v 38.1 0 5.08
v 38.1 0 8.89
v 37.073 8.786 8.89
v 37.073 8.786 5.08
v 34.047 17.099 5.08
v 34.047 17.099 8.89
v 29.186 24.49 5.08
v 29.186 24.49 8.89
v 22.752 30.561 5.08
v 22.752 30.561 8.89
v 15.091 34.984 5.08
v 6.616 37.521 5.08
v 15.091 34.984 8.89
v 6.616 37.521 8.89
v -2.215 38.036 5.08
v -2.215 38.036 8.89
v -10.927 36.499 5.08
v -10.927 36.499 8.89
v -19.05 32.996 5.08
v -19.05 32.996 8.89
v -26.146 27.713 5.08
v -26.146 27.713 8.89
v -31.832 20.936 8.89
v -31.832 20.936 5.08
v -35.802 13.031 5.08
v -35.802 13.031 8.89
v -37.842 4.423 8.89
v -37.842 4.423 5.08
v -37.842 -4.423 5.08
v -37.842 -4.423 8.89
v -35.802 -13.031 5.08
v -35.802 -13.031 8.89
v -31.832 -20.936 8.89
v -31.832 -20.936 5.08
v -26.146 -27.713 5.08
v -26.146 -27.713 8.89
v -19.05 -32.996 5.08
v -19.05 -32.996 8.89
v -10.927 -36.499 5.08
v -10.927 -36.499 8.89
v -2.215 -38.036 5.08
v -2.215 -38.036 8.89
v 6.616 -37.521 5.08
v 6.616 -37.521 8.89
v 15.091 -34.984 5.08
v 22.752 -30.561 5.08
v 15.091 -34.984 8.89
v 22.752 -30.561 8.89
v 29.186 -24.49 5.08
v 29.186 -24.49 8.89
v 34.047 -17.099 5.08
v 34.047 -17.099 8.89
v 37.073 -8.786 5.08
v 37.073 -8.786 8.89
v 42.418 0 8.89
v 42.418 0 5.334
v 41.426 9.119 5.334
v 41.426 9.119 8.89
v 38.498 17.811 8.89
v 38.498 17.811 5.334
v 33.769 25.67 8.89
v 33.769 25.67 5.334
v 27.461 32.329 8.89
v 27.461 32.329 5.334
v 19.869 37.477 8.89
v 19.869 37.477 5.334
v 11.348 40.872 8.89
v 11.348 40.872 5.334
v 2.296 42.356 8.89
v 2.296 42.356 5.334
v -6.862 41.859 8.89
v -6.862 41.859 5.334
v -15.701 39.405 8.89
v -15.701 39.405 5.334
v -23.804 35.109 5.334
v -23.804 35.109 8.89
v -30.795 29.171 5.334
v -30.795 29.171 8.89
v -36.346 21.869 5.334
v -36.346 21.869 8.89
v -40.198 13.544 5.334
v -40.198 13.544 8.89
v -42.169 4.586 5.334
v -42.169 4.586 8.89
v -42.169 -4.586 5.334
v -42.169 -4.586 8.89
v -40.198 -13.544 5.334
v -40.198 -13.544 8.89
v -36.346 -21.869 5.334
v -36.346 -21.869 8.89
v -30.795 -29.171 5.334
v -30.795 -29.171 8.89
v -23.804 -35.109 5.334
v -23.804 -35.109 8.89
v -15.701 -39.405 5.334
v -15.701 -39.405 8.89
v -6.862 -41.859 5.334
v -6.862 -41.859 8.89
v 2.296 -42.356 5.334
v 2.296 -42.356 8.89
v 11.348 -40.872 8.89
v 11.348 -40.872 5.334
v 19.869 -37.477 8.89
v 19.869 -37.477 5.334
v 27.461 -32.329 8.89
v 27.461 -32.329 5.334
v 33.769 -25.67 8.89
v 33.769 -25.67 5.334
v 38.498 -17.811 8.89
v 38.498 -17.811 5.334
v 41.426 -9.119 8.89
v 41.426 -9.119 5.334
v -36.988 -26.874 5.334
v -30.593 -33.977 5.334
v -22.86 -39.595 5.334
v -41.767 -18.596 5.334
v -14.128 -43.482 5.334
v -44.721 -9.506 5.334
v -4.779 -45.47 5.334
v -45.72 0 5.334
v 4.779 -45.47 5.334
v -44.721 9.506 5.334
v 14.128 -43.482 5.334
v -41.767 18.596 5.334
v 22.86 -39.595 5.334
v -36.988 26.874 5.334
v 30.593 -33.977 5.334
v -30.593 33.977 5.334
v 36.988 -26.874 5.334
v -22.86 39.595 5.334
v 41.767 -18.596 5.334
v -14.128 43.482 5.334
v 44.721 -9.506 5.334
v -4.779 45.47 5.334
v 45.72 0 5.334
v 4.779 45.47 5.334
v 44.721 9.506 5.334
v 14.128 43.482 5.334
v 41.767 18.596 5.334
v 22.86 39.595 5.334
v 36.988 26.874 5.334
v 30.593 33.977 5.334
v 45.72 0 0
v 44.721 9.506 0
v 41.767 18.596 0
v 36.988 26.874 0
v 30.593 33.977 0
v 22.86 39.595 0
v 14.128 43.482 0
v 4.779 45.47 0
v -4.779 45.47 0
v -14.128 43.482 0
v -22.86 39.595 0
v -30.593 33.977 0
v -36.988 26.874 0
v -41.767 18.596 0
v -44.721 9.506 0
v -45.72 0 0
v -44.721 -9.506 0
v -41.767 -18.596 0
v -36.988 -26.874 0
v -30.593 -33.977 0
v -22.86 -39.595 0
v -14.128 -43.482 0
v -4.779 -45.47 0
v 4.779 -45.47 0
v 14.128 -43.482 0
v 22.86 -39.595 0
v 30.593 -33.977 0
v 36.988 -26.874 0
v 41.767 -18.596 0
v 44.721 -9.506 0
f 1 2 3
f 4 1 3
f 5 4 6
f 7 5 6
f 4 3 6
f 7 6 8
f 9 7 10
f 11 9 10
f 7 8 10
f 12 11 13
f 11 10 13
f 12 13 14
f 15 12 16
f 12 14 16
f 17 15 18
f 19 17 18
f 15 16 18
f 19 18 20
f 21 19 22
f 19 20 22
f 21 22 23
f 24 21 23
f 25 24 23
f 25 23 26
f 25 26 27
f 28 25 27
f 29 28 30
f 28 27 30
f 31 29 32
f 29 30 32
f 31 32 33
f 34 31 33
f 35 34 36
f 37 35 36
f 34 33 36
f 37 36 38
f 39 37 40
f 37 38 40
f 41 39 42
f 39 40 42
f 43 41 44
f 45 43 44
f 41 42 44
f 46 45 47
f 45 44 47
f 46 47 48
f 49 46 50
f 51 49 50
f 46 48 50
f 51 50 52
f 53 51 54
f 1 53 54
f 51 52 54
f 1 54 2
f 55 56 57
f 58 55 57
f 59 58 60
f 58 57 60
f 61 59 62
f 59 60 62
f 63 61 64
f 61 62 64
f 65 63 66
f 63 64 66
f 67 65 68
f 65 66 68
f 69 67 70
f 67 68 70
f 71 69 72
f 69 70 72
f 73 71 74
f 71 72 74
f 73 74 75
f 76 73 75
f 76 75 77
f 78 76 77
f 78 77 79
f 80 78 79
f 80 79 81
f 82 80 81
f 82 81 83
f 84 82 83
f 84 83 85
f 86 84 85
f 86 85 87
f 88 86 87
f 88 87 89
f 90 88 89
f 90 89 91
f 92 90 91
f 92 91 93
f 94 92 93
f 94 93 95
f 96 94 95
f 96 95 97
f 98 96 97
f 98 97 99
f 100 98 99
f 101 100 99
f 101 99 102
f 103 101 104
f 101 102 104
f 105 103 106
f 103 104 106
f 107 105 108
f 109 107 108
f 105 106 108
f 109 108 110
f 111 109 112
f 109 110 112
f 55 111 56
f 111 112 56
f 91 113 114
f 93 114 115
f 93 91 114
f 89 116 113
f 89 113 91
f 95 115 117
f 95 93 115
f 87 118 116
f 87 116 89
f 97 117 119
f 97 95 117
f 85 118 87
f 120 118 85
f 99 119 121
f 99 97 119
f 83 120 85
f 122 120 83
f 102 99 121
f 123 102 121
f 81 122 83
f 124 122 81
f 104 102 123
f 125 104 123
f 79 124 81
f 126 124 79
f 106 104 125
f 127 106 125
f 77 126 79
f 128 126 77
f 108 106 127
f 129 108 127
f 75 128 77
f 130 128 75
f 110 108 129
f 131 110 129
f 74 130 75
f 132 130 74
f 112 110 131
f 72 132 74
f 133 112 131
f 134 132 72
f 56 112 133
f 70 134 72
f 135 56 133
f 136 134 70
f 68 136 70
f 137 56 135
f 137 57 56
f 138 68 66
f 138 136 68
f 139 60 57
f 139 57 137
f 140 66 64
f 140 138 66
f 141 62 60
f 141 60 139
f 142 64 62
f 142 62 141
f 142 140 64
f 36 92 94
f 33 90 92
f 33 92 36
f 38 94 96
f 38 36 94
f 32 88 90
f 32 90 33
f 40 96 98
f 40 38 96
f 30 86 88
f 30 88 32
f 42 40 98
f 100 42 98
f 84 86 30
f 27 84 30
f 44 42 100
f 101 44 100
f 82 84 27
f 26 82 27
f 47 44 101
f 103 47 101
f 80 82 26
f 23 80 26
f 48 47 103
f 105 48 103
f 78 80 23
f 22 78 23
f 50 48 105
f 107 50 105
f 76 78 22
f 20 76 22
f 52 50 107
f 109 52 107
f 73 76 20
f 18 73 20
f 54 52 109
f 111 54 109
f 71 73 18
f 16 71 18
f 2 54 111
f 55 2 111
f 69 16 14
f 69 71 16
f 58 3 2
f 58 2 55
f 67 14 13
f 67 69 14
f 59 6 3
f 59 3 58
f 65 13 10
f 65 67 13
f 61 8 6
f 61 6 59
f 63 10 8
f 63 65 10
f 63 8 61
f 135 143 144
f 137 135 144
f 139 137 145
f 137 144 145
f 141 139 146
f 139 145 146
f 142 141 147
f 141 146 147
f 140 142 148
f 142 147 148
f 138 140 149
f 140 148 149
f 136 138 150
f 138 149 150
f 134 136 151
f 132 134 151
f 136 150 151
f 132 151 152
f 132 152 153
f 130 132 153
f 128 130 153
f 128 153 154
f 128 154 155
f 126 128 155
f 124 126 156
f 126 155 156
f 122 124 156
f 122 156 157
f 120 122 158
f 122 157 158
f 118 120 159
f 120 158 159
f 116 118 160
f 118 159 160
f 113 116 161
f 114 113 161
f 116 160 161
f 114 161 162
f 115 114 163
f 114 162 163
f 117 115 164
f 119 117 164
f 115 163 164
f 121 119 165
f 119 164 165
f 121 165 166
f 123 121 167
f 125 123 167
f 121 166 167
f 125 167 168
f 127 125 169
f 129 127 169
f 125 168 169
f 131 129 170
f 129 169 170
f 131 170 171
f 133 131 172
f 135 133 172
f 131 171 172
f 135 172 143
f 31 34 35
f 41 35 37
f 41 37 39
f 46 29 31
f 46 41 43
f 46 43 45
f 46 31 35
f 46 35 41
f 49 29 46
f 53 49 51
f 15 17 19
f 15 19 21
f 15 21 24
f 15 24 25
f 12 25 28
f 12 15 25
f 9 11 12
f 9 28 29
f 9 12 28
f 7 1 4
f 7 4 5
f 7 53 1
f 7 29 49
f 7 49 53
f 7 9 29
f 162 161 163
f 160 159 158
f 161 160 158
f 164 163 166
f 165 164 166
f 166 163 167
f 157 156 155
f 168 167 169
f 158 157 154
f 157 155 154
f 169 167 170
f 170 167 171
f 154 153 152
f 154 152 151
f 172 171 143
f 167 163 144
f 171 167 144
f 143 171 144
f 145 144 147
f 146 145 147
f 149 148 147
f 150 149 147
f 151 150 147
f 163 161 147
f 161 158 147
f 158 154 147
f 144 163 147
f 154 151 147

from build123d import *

# Parameters (mm, degrees)
F0_R     = 45.72
F1_DEPTH = 5.334
F2_R     = 42.418
F3_DEPTH = 8.89
F4_R     = 38.1
F5_DEPTH = 3.81


with BuildPart() as f1:
    # F0 (on Top) → F1 (new body)
    with BuildSketch(Plane.XY):
        Circle(F0_R)
    extrude(amount=F1_DEPTH)

    # F2 (on Top) → F3 (join)
    with BuildSketch(Plane.XY):
        Circle(F2_R)
    extrude(amount=F3_DEPTH)

    # F4 (on face) → F5 (cut)
    with BuildSketch(Plane.XY.offset(8.89)):
        Circle(F4_R)
    extrude(amount=-F5_DEPTH, mode=Mode.SUBTRACT)


solid = f1.part
